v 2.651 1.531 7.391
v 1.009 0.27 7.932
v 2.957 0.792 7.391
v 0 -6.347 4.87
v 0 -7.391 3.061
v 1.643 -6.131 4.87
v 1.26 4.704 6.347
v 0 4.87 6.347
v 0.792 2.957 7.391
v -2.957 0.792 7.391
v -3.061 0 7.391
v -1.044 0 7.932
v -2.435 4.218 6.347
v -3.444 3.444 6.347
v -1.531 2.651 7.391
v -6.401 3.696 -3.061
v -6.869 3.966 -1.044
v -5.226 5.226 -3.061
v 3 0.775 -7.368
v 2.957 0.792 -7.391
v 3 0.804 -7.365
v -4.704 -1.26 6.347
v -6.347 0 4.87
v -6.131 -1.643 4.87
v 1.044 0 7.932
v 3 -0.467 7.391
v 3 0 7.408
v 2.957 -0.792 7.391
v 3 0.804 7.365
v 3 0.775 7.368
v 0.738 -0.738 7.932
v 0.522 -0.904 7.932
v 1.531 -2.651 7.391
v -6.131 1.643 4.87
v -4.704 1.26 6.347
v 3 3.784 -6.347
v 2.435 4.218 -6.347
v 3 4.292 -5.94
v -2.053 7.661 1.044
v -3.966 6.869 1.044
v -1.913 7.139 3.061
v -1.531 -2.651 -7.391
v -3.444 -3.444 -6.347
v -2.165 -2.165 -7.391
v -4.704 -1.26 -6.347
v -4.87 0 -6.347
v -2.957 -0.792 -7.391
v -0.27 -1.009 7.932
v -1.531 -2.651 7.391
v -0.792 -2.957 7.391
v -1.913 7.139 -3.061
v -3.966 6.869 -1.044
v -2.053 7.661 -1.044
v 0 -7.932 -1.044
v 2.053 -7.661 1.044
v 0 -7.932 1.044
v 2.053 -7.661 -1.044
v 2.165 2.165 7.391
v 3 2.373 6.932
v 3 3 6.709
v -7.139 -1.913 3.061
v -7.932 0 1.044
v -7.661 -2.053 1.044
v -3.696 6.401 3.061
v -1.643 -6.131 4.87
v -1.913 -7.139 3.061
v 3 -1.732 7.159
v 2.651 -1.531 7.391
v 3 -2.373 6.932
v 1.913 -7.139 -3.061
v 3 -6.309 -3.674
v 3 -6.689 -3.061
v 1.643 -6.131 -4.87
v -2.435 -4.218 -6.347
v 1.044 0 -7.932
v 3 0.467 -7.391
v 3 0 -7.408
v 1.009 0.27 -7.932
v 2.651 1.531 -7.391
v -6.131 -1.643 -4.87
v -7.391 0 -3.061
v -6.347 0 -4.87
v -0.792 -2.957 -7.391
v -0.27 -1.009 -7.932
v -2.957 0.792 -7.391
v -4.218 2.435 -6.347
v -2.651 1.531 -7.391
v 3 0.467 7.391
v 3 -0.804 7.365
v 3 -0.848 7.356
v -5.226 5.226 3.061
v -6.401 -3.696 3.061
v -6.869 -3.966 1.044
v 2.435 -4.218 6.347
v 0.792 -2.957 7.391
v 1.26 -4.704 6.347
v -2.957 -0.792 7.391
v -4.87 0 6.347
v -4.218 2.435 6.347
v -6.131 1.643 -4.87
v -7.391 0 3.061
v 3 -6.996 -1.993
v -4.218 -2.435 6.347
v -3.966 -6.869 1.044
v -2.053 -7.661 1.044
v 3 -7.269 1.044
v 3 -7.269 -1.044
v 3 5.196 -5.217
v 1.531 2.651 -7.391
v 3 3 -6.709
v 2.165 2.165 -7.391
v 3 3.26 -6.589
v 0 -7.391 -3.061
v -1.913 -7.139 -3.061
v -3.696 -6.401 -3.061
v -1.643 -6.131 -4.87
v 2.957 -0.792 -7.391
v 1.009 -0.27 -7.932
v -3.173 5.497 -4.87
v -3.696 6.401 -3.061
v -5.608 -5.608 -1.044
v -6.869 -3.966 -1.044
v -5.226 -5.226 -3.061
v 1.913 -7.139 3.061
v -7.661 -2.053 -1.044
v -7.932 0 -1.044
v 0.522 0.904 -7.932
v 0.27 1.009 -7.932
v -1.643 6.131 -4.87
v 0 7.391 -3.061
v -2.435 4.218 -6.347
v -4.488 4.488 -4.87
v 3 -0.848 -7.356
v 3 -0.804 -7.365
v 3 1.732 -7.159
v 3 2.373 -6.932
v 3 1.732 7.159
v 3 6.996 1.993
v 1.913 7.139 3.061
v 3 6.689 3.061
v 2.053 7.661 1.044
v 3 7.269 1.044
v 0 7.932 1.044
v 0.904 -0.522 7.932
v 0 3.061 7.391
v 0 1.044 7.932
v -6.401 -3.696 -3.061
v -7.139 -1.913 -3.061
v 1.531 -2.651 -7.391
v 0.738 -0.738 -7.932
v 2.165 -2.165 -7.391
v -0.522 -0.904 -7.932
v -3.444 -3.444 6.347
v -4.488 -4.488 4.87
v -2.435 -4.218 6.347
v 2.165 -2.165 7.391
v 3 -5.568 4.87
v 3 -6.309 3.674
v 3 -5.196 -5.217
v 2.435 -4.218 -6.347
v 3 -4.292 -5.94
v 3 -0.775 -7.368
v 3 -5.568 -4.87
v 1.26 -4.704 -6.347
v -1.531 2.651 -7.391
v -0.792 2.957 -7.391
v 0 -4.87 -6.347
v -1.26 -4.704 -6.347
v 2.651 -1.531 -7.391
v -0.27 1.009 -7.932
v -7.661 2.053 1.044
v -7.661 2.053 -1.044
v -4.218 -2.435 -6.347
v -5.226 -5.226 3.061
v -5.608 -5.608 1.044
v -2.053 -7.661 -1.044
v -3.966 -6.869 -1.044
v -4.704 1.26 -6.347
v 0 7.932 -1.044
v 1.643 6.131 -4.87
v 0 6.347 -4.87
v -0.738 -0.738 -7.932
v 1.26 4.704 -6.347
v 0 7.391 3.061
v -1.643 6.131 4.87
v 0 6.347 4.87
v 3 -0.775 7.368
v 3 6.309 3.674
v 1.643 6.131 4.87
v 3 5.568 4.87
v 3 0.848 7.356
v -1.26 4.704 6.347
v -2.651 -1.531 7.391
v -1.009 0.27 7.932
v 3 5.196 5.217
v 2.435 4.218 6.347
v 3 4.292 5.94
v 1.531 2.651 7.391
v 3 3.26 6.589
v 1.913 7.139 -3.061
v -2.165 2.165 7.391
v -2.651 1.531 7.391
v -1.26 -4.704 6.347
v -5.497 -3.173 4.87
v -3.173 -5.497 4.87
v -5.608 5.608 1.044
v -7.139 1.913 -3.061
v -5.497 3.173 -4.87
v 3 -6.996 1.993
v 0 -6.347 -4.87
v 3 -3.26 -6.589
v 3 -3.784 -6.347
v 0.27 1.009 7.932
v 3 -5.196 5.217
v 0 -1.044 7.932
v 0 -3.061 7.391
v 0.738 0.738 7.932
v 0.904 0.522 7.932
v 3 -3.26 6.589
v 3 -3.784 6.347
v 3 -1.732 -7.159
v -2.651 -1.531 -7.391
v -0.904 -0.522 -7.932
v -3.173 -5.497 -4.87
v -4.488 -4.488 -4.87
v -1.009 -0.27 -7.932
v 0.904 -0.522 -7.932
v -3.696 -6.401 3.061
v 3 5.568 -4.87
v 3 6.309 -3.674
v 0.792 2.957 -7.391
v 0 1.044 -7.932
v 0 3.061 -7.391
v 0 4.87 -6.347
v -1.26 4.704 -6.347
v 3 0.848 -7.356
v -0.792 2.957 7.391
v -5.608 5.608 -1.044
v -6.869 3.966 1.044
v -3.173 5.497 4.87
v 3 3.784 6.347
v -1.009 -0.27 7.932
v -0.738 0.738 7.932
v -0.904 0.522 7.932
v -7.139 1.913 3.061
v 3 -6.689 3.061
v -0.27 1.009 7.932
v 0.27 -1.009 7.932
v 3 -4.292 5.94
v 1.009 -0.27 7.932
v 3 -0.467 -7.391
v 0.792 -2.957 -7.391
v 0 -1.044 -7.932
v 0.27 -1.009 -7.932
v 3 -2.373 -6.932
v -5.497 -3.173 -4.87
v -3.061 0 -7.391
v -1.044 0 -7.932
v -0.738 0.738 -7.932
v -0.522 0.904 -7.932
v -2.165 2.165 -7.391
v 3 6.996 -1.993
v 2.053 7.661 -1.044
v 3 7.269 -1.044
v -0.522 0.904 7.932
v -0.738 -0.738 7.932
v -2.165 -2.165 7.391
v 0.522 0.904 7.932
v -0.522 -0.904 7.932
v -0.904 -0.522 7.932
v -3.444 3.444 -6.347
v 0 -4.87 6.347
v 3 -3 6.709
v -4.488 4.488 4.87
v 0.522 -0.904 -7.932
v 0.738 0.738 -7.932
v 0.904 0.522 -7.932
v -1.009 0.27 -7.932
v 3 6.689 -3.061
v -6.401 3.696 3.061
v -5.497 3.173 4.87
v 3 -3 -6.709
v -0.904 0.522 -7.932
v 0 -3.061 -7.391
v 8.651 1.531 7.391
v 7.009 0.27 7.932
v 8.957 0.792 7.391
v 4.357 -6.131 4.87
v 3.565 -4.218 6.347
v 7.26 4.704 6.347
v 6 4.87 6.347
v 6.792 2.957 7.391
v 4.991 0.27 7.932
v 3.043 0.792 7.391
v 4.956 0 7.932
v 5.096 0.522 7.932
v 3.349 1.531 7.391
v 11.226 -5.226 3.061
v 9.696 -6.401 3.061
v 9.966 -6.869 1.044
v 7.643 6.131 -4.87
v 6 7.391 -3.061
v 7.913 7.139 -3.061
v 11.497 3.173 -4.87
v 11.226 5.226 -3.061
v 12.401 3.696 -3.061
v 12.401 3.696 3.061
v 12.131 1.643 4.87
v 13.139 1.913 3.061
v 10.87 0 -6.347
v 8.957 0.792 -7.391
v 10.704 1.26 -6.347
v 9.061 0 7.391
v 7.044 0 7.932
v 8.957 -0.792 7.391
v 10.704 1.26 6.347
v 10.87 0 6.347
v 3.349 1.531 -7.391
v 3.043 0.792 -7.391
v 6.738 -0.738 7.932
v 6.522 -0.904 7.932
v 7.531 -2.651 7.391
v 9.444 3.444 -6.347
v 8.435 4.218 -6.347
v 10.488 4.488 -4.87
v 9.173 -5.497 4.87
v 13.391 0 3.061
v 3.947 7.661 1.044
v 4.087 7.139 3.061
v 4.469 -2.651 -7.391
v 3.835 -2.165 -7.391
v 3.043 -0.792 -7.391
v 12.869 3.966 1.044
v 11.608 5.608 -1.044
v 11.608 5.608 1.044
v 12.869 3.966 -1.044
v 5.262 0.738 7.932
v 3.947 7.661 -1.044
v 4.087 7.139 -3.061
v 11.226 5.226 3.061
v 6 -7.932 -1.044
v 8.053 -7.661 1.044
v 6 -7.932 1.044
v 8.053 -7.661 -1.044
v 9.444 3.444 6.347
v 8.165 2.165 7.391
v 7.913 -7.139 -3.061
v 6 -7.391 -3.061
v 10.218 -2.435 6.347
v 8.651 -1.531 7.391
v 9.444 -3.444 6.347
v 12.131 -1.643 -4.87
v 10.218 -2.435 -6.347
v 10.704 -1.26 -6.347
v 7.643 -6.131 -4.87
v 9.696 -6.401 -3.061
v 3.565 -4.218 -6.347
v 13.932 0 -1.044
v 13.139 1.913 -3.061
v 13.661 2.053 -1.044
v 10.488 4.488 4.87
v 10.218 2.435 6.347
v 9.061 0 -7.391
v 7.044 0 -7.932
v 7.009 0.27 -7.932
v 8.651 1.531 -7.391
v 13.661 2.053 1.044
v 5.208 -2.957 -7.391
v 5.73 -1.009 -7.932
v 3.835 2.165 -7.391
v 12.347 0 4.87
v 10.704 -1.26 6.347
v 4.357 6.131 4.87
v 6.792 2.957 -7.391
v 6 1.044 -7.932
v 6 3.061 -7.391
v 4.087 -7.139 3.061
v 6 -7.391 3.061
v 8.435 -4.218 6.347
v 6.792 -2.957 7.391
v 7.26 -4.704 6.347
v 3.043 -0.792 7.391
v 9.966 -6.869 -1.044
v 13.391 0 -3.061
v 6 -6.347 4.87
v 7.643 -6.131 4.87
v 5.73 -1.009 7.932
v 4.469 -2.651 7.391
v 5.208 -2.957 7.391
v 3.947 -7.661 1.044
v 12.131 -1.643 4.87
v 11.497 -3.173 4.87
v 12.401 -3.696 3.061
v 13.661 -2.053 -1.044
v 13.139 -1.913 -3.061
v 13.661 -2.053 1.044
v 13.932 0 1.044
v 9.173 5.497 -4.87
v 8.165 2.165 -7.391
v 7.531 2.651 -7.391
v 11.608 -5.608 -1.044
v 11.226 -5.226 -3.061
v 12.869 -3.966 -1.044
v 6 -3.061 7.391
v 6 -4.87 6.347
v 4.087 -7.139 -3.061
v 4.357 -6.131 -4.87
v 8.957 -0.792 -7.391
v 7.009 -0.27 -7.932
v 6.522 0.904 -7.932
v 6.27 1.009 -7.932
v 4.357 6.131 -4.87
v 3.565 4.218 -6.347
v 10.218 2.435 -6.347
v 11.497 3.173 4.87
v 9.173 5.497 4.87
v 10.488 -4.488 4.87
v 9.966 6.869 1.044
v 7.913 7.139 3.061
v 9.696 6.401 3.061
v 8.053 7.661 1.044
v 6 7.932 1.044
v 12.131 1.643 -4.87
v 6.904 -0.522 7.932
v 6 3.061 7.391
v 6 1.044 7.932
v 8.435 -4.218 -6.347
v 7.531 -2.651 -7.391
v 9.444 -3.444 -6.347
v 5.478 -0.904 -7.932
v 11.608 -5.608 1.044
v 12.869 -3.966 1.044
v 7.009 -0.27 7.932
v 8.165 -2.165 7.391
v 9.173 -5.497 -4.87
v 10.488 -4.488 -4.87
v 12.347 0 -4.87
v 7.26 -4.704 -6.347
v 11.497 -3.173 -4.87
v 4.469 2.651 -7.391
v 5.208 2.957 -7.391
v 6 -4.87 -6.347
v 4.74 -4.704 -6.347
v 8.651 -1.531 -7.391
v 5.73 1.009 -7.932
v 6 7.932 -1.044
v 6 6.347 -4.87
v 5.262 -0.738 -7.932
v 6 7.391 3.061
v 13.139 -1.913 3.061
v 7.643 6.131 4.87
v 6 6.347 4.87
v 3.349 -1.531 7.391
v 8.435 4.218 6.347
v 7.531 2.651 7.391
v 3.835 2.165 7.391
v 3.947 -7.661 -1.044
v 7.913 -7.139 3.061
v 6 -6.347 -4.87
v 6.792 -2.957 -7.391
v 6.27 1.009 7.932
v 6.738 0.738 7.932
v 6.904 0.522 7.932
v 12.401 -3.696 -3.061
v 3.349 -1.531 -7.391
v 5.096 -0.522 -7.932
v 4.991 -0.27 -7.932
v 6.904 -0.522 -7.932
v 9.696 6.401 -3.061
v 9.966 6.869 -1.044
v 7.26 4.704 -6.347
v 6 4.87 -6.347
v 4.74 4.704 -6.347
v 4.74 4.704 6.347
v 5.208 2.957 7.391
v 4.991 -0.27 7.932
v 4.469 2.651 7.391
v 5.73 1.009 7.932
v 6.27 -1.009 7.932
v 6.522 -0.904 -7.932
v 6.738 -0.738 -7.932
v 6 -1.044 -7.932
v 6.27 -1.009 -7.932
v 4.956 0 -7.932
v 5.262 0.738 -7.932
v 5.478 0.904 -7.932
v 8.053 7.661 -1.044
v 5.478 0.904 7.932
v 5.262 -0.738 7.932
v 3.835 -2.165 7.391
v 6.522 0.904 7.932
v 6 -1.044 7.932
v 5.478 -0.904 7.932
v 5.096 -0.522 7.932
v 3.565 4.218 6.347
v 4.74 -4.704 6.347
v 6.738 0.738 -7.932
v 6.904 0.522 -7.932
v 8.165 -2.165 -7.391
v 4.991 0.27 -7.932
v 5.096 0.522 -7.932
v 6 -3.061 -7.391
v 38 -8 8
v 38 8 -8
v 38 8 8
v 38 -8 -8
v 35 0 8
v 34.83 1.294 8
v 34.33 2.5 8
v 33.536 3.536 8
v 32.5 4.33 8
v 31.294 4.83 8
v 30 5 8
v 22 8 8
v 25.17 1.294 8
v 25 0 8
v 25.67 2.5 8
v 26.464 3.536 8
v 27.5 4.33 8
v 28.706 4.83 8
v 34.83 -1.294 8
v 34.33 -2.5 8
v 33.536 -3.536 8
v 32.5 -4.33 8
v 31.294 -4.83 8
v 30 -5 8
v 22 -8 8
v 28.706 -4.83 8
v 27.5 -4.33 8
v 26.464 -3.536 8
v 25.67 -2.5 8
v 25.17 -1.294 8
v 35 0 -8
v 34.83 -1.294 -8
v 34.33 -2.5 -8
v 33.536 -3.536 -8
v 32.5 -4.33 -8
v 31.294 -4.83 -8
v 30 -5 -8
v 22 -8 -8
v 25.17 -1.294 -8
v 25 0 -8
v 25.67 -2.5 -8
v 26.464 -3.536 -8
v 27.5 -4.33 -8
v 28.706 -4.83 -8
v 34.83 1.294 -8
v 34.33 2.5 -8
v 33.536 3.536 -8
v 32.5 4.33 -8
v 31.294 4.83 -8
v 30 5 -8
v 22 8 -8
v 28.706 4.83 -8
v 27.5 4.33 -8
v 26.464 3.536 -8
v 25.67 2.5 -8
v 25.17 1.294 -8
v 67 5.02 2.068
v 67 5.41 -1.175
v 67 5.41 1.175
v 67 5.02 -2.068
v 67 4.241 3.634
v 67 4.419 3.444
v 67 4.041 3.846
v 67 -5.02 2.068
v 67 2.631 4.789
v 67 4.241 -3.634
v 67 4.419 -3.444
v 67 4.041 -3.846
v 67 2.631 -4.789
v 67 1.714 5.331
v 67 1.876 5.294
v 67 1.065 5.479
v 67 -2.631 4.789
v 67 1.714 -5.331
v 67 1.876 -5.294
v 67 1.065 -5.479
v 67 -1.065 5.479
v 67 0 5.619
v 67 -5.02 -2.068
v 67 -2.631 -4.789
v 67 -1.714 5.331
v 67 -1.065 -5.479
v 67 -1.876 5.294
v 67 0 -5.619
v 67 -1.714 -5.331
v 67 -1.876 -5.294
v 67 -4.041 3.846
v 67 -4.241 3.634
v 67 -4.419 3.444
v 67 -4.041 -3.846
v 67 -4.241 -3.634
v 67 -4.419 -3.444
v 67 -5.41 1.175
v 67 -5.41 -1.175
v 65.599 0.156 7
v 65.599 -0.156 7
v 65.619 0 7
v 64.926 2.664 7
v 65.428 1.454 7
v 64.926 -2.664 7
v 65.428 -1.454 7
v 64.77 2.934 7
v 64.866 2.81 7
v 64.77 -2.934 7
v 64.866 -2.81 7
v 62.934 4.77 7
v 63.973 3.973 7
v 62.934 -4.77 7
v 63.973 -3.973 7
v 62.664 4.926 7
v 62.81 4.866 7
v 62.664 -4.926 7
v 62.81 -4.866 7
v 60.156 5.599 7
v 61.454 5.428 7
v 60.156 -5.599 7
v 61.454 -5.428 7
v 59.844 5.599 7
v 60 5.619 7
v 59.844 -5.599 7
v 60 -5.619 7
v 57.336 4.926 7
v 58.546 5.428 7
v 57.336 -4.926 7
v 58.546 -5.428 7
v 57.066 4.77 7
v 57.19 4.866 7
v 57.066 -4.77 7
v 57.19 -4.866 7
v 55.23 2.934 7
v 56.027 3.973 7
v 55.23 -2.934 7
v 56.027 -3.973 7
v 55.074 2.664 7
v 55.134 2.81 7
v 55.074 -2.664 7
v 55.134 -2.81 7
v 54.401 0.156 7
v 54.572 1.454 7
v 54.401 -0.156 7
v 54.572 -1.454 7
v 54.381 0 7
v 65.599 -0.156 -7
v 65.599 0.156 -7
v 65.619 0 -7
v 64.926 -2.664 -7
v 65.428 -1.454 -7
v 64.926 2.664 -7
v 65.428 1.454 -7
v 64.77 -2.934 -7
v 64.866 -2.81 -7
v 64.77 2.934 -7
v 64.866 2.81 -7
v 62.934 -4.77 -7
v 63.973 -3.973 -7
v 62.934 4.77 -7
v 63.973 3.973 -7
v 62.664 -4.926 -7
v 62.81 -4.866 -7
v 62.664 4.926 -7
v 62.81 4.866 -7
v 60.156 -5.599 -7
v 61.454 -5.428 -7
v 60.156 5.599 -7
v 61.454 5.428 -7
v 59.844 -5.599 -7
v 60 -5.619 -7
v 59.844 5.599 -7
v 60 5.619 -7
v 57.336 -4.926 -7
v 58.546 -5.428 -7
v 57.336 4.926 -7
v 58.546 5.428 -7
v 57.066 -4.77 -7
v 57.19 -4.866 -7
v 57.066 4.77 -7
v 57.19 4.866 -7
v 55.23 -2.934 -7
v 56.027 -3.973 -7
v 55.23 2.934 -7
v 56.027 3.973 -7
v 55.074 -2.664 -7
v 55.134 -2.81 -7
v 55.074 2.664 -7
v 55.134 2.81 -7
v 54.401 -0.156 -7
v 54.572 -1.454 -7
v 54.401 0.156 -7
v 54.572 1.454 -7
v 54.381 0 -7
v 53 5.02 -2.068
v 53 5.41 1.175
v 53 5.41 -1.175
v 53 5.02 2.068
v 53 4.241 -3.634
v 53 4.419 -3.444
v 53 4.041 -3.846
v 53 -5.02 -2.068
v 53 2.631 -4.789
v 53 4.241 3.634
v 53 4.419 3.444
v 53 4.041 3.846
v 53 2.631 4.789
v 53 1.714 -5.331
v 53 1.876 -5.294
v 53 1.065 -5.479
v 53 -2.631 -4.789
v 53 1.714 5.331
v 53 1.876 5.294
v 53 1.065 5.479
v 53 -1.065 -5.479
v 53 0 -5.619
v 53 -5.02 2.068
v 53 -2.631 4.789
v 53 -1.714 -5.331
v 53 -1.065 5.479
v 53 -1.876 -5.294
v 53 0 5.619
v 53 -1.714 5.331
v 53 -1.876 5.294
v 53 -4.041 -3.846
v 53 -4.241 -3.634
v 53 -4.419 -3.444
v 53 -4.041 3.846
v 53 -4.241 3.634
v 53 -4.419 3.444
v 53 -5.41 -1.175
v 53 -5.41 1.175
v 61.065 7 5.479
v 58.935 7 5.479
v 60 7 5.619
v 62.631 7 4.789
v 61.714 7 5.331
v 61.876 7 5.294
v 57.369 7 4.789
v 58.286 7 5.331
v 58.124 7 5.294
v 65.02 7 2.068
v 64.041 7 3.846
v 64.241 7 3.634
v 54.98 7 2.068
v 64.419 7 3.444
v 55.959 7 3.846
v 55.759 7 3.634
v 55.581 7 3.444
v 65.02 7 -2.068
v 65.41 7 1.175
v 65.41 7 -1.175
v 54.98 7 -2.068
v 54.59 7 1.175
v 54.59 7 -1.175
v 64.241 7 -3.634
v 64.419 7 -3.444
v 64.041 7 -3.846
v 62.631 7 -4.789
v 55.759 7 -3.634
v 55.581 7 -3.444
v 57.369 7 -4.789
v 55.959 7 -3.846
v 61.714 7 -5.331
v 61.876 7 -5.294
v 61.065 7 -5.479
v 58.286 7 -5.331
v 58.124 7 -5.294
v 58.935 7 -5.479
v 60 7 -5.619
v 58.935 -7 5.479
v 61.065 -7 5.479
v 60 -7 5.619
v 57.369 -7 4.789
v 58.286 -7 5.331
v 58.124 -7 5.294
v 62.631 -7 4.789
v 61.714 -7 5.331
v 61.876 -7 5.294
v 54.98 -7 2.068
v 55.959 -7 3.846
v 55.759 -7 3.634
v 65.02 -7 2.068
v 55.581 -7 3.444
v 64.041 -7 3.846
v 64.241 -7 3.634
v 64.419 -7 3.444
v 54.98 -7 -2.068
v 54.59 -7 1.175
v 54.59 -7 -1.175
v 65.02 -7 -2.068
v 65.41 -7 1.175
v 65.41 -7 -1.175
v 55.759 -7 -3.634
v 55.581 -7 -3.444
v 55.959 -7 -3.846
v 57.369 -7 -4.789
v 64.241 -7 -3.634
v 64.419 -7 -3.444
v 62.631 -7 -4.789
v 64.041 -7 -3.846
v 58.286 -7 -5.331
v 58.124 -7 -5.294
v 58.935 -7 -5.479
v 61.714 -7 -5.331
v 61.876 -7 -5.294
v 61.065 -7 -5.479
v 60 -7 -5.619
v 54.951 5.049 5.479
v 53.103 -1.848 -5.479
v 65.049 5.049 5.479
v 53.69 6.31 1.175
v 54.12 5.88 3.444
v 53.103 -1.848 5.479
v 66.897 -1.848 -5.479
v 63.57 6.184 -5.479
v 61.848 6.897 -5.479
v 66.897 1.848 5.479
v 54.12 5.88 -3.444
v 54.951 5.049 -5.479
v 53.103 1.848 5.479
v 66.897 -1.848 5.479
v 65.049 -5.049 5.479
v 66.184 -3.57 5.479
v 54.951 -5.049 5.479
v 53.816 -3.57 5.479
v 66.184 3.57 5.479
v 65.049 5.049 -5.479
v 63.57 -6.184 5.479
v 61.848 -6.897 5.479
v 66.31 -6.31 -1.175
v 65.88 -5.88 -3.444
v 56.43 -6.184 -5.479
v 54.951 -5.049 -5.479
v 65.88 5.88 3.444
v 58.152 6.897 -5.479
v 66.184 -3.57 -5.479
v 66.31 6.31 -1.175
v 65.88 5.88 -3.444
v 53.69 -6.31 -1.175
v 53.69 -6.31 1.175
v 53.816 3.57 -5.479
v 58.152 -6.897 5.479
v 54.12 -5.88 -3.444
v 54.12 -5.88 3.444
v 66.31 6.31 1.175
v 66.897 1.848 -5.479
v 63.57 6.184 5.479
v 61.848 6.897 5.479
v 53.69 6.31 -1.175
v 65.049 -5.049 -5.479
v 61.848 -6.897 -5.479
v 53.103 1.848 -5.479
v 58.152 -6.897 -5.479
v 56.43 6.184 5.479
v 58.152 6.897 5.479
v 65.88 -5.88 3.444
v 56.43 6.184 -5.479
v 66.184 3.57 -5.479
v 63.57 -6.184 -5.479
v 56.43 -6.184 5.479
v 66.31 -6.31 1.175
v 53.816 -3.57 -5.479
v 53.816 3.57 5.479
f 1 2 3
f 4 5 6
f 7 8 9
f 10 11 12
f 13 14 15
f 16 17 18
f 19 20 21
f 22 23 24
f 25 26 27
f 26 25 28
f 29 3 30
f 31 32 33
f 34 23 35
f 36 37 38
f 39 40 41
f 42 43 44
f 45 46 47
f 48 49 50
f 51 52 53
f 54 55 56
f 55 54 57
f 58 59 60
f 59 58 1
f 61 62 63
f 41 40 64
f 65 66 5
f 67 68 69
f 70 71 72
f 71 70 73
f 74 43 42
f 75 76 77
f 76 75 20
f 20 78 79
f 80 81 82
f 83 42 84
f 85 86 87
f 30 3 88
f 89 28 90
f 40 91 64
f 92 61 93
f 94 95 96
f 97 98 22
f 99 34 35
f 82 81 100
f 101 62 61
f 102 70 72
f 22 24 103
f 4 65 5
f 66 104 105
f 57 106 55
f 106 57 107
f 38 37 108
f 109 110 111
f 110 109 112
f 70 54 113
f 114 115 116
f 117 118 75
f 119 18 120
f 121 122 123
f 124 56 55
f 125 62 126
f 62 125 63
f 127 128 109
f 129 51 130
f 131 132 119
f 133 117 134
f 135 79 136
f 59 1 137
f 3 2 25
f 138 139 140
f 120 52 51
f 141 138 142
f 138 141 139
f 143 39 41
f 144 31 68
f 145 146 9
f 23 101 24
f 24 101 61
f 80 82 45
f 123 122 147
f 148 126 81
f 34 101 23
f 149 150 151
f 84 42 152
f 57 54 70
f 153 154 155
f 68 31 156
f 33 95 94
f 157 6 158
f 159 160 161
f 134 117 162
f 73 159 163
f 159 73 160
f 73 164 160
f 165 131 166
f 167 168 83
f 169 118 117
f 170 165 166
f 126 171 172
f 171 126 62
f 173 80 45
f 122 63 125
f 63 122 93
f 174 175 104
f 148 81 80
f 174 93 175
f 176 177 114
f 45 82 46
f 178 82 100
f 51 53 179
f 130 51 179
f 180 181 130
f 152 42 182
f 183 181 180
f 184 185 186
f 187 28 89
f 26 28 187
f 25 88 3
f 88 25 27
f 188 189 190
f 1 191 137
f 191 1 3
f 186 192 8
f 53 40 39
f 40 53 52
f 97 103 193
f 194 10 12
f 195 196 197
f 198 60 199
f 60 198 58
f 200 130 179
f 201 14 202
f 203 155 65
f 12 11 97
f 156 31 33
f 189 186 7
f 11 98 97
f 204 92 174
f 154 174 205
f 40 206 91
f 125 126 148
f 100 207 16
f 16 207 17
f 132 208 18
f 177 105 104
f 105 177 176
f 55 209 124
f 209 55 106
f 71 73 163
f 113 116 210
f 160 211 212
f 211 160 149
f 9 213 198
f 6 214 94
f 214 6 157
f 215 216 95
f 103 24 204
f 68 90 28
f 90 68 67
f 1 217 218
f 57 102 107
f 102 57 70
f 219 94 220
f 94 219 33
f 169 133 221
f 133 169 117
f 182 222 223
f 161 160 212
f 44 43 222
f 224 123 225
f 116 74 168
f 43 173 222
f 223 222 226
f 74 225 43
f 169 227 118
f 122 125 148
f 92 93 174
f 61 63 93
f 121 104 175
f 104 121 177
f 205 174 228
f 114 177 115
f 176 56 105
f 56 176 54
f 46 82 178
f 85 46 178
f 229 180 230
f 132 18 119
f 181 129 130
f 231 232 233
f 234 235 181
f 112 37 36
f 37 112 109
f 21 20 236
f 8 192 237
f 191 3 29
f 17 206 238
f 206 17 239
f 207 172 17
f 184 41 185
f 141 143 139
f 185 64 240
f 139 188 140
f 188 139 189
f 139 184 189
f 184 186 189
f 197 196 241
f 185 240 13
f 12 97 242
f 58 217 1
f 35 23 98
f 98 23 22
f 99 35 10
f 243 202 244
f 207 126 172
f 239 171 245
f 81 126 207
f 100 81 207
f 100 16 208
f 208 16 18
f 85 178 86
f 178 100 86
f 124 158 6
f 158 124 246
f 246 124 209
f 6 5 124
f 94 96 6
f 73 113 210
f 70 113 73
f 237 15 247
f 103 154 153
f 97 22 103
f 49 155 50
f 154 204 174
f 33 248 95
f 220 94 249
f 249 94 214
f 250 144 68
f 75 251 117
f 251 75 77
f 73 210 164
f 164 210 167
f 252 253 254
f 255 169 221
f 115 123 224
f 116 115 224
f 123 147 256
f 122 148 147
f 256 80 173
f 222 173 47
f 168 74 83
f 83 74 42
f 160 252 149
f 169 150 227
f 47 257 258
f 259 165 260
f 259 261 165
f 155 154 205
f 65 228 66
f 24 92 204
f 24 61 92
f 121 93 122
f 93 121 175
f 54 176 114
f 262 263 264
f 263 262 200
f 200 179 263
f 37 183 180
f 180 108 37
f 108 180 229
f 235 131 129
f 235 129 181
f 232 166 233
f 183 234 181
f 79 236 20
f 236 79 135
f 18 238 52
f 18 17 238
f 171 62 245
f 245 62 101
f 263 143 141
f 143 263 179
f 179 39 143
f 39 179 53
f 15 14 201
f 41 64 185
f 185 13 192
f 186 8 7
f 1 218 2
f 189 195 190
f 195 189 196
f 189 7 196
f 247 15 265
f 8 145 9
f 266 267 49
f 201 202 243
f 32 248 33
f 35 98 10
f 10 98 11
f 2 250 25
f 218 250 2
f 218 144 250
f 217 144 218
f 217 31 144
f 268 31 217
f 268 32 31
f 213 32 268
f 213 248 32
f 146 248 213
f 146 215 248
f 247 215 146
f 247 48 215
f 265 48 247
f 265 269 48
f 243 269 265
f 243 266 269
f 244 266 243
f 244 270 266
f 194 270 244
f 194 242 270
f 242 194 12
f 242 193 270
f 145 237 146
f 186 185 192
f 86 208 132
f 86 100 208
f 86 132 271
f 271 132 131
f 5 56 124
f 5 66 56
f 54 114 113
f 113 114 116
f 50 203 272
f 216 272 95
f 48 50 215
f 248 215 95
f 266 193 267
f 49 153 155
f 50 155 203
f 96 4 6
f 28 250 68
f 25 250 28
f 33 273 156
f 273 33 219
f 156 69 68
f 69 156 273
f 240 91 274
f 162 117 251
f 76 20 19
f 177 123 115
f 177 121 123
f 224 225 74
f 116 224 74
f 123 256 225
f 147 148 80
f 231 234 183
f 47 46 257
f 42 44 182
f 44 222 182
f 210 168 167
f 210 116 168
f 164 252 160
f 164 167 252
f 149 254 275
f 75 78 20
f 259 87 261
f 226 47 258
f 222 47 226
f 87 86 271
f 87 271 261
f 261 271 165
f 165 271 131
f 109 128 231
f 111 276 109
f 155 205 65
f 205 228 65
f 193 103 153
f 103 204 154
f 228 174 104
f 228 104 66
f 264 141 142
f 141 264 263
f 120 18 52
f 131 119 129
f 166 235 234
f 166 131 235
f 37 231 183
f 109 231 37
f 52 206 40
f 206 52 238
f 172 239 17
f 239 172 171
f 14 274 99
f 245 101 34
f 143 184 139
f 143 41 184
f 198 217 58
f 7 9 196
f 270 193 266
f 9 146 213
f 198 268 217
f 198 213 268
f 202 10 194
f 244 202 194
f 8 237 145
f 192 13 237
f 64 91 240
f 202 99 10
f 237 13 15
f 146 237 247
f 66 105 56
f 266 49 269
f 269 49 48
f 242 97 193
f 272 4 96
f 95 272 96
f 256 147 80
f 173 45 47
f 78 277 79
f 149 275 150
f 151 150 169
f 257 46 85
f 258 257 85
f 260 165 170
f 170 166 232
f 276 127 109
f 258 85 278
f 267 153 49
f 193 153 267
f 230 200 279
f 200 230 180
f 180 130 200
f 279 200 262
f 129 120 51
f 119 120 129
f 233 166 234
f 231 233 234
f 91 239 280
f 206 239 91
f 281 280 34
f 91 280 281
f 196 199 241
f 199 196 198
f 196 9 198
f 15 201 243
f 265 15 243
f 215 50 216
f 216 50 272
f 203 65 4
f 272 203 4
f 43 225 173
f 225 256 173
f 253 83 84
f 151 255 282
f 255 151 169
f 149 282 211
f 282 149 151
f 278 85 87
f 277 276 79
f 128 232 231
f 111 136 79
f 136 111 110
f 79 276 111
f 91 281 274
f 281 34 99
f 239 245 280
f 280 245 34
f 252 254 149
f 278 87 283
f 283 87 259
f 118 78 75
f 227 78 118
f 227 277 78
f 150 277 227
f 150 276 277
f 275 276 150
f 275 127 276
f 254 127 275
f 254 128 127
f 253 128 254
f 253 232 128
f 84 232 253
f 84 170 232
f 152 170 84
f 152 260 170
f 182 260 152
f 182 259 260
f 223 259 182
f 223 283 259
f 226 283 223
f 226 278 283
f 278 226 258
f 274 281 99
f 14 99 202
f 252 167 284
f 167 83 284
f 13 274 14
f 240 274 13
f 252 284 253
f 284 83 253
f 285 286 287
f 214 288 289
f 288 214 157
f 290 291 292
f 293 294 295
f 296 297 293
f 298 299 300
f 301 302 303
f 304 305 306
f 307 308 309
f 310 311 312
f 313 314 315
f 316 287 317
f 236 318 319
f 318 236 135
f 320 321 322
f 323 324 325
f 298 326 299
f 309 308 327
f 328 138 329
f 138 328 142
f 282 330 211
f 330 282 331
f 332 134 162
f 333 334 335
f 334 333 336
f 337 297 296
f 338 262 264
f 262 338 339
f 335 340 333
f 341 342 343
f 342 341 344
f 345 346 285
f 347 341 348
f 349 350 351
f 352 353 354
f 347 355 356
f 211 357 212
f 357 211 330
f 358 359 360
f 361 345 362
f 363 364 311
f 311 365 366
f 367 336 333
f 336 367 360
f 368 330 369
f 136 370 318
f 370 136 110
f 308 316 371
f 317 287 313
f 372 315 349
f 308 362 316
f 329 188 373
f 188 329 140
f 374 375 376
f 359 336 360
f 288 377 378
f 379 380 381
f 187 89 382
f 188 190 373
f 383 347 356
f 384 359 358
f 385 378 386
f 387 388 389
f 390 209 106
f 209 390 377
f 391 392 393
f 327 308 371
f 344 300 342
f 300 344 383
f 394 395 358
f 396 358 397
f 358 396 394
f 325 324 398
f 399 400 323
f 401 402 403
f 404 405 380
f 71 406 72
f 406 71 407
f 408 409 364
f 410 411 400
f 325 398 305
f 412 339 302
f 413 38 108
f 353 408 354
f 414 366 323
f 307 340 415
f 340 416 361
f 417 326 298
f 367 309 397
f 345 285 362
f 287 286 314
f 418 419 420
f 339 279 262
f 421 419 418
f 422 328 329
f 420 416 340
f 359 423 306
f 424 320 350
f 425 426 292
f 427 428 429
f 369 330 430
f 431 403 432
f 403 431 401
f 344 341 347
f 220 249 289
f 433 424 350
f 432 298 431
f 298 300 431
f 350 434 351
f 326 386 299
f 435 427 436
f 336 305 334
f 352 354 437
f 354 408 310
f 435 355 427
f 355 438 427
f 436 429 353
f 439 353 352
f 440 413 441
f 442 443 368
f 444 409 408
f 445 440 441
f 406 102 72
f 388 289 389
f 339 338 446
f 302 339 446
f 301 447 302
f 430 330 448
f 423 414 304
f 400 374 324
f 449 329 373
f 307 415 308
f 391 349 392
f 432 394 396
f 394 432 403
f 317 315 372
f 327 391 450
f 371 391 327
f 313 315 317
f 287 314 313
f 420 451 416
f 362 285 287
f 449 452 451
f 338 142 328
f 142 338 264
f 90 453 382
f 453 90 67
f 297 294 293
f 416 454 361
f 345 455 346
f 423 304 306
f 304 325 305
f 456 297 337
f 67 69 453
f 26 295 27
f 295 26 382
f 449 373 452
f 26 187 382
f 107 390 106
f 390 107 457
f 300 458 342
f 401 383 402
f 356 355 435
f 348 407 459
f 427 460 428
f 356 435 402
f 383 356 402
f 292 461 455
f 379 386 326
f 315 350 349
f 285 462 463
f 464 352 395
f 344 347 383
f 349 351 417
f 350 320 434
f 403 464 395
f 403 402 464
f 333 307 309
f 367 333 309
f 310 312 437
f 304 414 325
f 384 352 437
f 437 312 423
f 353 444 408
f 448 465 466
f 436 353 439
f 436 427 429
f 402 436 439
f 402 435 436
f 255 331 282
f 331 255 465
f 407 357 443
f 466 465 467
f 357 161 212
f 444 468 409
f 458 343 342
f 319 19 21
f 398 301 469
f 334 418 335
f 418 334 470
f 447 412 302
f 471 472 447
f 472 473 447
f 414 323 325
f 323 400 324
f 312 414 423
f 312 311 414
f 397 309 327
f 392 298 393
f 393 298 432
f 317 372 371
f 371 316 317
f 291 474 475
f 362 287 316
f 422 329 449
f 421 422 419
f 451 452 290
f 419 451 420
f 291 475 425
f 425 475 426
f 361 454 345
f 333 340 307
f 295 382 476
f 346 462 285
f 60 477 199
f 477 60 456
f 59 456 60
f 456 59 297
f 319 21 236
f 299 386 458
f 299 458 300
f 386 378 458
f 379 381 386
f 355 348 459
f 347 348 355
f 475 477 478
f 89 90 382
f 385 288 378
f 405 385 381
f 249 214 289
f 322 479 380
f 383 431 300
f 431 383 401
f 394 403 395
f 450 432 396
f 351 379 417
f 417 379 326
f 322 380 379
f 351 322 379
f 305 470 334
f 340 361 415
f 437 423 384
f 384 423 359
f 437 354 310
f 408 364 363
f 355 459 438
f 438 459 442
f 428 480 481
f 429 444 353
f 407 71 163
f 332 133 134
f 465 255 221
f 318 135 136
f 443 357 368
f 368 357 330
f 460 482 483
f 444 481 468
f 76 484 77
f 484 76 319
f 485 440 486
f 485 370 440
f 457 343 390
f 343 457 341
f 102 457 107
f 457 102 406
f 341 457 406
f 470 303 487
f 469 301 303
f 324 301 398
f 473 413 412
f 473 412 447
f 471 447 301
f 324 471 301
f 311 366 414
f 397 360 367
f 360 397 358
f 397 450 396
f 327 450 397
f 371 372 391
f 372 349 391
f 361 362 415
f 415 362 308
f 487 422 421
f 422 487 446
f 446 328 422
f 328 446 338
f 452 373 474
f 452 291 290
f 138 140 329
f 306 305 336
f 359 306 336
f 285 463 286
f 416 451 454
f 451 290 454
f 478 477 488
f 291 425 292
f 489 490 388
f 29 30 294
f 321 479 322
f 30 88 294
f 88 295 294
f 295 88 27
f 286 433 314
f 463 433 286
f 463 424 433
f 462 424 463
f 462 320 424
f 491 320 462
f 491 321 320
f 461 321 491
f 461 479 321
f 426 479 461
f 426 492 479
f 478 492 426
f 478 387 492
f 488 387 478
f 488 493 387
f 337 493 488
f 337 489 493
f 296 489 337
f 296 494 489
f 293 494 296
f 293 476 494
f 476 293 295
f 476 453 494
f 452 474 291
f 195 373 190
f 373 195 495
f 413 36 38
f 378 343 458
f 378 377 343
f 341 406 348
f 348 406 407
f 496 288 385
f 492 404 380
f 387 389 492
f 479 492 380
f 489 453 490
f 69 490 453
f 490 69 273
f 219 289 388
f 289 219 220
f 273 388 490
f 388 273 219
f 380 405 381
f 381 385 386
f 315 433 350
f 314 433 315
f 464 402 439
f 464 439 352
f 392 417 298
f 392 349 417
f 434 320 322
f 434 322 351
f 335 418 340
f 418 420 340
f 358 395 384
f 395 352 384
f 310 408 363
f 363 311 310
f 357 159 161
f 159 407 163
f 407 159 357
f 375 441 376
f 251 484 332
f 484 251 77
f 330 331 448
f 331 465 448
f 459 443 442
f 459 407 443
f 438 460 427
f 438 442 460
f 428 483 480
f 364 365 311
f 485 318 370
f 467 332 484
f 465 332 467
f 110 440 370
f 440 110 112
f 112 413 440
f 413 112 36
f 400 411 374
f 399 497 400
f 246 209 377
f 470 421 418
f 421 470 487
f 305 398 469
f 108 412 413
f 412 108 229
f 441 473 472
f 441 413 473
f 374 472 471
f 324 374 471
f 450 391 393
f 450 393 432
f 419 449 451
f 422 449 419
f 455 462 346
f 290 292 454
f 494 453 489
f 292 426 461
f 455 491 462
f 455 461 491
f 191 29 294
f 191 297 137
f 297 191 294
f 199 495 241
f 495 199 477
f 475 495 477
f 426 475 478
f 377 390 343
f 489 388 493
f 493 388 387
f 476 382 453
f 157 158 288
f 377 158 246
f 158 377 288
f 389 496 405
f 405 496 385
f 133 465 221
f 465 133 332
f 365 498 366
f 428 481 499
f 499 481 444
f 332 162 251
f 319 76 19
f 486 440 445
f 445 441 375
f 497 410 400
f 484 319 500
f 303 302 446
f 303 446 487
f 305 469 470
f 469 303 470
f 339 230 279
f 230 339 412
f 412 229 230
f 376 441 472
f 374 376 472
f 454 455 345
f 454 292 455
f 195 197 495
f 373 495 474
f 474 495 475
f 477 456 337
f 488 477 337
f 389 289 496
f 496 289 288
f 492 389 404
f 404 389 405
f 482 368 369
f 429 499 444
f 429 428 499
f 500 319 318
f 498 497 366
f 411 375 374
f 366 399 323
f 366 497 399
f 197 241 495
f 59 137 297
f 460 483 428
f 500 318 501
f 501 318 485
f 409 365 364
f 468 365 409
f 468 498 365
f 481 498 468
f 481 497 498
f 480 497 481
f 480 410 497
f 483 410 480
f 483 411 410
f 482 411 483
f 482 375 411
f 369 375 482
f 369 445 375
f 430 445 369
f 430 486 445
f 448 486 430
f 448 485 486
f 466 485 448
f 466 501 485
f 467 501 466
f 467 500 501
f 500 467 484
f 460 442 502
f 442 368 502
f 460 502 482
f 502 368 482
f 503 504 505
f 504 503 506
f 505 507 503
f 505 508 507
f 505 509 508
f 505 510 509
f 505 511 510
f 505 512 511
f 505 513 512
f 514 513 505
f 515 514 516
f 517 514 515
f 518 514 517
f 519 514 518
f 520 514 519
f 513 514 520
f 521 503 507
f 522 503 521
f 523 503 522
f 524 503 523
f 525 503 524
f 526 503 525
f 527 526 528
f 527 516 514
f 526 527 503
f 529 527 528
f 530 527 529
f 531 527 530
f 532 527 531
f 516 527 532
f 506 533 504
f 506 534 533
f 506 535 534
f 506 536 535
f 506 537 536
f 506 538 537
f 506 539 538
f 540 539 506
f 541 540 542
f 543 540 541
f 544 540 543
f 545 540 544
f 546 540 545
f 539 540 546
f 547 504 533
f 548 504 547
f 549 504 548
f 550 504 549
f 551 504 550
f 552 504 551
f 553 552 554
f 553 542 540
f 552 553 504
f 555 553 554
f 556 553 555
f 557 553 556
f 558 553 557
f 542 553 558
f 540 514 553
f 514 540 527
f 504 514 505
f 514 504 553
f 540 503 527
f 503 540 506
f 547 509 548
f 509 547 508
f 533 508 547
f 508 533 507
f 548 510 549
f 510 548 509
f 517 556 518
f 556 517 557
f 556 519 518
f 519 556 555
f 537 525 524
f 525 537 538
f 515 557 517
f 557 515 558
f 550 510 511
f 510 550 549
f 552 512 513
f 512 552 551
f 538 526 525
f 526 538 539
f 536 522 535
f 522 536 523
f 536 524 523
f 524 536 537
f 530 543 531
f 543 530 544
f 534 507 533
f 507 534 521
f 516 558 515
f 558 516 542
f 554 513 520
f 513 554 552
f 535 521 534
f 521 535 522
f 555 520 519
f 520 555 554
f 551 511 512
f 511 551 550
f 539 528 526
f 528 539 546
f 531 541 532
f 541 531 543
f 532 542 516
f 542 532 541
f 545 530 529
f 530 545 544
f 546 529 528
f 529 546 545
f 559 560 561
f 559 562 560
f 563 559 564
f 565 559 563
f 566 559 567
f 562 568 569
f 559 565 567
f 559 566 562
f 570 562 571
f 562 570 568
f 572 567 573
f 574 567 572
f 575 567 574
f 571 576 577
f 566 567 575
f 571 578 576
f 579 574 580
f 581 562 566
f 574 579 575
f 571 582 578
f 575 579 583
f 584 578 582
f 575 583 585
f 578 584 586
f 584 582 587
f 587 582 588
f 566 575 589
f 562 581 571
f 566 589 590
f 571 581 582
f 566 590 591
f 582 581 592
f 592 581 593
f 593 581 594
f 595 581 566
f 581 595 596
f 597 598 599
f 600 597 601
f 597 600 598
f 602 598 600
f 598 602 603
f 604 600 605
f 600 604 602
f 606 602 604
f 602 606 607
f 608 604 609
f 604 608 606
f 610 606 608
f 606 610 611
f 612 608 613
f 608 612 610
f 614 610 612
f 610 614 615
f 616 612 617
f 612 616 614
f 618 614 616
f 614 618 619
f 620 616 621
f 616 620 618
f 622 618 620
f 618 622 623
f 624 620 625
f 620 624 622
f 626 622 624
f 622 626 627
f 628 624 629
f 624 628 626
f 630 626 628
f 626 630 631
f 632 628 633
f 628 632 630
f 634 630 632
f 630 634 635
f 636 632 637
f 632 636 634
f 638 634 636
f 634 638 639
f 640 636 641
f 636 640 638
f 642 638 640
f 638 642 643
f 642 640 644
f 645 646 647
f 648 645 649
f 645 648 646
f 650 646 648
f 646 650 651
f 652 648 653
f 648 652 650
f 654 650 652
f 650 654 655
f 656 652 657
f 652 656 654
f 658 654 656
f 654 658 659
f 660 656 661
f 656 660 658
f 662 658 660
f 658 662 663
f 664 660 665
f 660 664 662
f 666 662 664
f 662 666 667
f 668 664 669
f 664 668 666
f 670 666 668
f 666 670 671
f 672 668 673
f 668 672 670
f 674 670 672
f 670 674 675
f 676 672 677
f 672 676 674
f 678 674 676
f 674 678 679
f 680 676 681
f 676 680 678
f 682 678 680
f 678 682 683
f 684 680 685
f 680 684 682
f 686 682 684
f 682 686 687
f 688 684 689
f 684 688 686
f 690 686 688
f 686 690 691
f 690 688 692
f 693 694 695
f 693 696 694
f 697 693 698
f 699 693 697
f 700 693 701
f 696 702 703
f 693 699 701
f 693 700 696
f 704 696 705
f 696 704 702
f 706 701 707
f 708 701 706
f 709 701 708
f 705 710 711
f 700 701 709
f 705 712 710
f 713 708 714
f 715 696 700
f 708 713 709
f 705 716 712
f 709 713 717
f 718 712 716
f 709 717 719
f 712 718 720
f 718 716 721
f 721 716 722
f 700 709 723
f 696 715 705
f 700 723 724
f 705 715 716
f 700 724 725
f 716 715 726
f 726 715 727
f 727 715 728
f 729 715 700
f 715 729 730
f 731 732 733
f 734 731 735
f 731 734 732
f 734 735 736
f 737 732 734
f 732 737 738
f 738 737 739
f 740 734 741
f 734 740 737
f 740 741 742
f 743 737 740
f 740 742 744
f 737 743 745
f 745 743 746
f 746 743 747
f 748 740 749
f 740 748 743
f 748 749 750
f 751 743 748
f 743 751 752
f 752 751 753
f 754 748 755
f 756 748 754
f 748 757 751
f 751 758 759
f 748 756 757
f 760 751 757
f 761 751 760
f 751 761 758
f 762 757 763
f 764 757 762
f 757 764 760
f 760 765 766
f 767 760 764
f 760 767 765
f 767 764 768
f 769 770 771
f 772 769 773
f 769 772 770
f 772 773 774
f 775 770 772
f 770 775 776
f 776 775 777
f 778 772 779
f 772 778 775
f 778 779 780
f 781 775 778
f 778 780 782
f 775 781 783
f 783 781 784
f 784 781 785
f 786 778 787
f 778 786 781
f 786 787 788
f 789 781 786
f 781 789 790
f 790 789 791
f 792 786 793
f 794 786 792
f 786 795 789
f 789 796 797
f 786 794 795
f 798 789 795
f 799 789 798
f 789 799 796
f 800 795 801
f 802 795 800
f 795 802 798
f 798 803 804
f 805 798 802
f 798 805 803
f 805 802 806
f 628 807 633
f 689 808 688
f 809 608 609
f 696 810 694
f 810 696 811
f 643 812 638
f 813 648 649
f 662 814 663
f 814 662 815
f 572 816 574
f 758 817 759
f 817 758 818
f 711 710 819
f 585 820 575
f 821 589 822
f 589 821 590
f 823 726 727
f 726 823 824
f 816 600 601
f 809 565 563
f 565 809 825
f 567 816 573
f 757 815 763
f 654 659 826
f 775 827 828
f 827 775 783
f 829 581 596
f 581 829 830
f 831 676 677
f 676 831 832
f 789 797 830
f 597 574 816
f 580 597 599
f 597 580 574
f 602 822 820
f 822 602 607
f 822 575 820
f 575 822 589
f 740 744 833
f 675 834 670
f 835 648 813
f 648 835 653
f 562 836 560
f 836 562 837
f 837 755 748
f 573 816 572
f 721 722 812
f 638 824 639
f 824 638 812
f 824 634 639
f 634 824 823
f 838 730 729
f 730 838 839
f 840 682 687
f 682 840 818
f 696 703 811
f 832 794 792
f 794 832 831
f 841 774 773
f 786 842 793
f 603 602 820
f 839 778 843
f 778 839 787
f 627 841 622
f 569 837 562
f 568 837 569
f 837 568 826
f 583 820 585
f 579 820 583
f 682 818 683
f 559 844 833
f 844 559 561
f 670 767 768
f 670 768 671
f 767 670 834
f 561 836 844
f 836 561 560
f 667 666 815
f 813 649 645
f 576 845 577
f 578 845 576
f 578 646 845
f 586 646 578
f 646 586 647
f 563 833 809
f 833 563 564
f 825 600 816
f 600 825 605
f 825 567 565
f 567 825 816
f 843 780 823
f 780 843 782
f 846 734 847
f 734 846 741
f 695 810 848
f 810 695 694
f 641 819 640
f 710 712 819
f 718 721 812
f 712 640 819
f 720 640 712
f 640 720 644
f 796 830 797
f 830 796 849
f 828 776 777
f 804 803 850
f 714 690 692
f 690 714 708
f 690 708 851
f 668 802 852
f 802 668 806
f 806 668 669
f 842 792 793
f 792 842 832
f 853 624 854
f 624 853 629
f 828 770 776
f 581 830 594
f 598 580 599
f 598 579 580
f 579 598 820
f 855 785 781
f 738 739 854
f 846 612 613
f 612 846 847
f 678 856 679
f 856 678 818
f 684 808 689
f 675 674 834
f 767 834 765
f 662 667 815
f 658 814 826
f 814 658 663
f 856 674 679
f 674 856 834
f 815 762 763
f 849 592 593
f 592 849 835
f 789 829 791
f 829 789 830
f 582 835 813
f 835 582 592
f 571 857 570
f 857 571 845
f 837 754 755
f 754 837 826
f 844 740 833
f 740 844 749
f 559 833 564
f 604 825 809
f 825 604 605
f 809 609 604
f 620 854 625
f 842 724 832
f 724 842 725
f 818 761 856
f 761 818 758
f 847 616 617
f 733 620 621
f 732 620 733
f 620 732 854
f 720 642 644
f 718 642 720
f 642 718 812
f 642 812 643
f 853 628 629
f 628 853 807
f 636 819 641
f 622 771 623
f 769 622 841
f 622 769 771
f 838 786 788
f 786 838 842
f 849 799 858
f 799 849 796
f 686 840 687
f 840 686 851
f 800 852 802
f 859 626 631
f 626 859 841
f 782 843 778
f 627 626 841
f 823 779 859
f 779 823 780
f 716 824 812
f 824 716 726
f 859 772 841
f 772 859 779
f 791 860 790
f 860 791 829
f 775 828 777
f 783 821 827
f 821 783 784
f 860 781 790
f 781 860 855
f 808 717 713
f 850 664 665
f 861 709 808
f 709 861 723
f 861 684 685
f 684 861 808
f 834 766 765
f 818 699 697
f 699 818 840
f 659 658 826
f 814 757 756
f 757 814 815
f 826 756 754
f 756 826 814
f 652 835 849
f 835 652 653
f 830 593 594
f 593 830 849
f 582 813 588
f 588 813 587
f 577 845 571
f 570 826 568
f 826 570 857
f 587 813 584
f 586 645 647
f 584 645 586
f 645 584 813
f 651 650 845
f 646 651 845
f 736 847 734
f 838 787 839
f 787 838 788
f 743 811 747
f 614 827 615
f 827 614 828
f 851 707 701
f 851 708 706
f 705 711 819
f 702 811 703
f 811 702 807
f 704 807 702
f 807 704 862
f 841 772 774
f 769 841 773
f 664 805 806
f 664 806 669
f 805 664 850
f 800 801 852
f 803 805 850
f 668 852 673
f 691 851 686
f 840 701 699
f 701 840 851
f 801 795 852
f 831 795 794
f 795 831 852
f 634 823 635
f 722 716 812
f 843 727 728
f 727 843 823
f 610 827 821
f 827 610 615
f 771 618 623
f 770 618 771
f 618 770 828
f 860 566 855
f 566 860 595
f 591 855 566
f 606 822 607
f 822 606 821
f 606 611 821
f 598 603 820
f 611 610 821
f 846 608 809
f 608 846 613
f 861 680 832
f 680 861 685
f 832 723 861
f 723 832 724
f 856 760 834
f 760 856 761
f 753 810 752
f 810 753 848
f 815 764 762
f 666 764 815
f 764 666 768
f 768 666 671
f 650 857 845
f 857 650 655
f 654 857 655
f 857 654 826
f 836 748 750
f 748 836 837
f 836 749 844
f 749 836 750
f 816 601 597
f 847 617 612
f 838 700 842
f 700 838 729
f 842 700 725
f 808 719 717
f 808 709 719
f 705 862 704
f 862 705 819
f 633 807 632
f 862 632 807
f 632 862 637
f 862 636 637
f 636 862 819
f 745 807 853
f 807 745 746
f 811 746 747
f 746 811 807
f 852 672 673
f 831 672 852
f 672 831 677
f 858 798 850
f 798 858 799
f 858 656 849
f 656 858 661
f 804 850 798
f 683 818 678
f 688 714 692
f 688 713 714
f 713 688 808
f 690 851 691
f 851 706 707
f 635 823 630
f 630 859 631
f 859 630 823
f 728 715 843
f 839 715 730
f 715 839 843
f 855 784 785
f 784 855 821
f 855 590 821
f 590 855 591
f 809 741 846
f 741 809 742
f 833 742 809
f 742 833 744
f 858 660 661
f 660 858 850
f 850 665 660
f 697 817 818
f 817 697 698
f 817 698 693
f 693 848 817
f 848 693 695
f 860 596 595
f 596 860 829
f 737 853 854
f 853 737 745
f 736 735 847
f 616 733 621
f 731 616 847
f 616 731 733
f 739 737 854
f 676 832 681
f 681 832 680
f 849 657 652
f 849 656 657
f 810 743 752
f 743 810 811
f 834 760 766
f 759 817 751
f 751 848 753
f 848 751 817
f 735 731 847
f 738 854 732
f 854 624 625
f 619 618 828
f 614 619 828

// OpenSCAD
// TEST 03: CSG — union, difference, intersection
// Expected tree: 3 operations, each with 2 children.
// Check: mesh is correct — difference cuts hole, intersection is overlap only.

$fn = 24;

// union of two overlapping spheres
translate([0, 0, 0]) {
    union() {
        sphere(r=8);
        translate([6, 0, 0]) {
            sphere(r=8);
        }
    }
}

// difference: cube minus cylinder hole
translate([30, 0, 0]) {
    difference() {
        cube([16, 16, 16], center=true);
        cylinder(h=20, r=5, center=true);
    }
}

// intersection: cube and sphere
translate([60, 0, 0]) {
    intersection() {
        cube([14, 14, 14], center=true);
        sphere(r=9);
    }
}
